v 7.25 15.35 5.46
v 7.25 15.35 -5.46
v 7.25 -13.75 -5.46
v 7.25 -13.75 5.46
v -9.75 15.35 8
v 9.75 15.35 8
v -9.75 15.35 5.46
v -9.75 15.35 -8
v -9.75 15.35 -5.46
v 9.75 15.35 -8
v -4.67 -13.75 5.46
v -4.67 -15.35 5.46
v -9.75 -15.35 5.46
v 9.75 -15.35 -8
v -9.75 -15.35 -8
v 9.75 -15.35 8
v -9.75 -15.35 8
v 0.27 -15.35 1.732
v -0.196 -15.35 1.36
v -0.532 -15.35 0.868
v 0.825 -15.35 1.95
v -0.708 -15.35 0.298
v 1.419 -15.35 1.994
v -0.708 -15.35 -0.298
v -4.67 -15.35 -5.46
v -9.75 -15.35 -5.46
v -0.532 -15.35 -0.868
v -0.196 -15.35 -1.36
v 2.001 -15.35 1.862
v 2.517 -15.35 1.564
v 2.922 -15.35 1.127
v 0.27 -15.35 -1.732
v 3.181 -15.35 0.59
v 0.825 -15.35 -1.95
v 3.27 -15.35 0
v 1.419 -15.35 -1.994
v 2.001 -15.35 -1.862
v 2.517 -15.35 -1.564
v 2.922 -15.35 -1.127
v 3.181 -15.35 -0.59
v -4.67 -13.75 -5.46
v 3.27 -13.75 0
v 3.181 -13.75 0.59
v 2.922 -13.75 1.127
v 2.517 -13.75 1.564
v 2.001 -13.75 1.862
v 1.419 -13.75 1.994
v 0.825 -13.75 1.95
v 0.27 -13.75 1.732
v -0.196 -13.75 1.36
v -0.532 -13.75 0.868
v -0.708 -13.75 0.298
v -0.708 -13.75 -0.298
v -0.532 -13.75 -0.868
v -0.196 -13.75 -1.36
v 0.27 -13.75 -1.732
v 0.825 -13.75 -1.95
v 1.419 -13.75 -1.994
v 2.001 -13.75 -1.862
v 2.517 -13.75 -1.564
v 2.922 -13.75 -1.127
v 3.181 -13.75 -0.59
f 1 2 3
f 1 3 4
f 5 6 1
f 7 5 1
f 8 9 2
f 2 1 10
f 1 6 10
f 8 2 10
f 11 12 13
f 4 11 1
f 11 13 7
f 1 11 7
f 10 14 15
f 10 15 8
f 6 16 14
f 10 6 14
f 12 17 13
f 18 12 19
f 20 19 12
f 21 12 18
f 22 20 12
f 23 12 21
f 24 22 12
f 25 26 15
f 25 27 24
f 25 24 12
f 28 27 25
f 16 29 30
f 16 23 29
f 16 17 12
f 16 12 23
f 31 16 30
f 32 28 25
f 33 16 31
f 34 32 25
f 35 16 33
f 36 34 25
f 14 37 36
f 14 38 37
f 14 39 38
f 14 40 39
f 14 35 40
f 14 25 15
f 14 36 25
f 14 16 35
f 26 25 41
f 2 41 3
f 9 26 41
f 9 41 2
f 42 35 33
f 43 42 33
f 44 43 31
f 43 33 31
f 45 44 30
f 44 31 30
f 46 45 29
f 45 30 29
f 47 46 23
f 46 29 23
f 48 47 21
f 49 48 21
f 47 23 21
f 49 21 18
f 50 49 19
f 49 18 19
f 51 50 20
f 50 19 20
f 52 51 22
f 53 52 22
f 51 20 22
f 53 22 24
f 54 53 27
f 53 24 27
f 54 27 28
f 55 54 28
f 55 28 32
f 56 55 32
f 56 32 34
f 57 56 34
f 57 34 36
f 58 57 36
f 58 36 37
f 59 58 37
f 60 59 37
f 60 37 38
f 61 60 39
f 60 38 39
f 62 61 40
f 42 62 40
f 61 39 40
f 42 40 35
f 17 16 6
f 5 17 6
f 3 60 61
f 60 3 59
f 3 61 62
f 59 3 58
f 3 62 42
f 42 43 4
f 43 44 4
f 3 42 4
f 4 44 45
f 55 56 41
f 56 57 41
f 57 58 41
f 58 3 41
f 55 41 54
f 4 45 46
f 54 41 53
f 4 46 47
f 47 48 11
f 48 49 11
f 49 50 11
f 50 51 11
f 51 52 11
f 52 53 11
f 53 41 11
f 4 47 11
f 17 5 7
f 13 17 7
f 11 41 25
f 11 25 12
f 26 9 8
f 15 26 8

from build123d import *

# Parameters (mm, degrees)
SKETCH2_W               = 16
SKETCH2_H               = 30.7
BOSS_EXTRUDE1_DEPTH     = 9.75
SKETCH3_W               = 10.92
SKETCH3_H               = 29.1
CUT_EXTRUDE1_DEPTH      = 17
SKETCH4_W               = 10.92
SKETCH4_H               = 1.6
CUT_EXTRUDE2_DEPTH      = 5.08
SKETCH5_R               = 2
HOLE_FOR_ACTUATOR_DEPTH = 1.6


with BuildPart() as part:
    # Sketch2 → Boss-Extrude1 (new body, symmetric)
    with BuildSketch(Plane(origin=(0, 0, 0), x_dir=(0, 0, -1), z_dir=(1, 0, 0))):
        Rectangle(SKETCH2_W, SKETCH2_H)
    extrude(amount=BOSS_EXTRUDE1_DEPTH, both=True)

    # Sketch3 → Cut-Extrude1 (cut)
    with BuildSketch(Plane.ZY.offset(9.75)):
        with Locations((0, 0.8)):
            Rectangle(SKETCH3_W, SKETCH3_H)
    extrude(amount=-CUT_EXTRUDE1_DEPTH, mode=Mode.SUBTRACT)

    # Sketch4 → Cut-Extrude2 (cut)
    with BuildSketch(Plane.ZY.offset(9.75)):
        with Locations((0, -14.55)):
            Rectangle(SKETCH4_W, SKETCH4_H)
    extrude(amount=-CUT_EXTRUDE2_DEPTH, mode=Mode.SUBTRACT)

    # Sketch5 → Hole for Actuator (cut)
    with BuildSketch(Plane.XZ.offset(15.35)):
        with Locations((1.27, 0)):
            Circle(SKETCH5_R)
    extrude(amount=-HOLE_FOR_ACTUATOR_DEPTH, mode=Mode.SUBTRACT)


solid = part.part
